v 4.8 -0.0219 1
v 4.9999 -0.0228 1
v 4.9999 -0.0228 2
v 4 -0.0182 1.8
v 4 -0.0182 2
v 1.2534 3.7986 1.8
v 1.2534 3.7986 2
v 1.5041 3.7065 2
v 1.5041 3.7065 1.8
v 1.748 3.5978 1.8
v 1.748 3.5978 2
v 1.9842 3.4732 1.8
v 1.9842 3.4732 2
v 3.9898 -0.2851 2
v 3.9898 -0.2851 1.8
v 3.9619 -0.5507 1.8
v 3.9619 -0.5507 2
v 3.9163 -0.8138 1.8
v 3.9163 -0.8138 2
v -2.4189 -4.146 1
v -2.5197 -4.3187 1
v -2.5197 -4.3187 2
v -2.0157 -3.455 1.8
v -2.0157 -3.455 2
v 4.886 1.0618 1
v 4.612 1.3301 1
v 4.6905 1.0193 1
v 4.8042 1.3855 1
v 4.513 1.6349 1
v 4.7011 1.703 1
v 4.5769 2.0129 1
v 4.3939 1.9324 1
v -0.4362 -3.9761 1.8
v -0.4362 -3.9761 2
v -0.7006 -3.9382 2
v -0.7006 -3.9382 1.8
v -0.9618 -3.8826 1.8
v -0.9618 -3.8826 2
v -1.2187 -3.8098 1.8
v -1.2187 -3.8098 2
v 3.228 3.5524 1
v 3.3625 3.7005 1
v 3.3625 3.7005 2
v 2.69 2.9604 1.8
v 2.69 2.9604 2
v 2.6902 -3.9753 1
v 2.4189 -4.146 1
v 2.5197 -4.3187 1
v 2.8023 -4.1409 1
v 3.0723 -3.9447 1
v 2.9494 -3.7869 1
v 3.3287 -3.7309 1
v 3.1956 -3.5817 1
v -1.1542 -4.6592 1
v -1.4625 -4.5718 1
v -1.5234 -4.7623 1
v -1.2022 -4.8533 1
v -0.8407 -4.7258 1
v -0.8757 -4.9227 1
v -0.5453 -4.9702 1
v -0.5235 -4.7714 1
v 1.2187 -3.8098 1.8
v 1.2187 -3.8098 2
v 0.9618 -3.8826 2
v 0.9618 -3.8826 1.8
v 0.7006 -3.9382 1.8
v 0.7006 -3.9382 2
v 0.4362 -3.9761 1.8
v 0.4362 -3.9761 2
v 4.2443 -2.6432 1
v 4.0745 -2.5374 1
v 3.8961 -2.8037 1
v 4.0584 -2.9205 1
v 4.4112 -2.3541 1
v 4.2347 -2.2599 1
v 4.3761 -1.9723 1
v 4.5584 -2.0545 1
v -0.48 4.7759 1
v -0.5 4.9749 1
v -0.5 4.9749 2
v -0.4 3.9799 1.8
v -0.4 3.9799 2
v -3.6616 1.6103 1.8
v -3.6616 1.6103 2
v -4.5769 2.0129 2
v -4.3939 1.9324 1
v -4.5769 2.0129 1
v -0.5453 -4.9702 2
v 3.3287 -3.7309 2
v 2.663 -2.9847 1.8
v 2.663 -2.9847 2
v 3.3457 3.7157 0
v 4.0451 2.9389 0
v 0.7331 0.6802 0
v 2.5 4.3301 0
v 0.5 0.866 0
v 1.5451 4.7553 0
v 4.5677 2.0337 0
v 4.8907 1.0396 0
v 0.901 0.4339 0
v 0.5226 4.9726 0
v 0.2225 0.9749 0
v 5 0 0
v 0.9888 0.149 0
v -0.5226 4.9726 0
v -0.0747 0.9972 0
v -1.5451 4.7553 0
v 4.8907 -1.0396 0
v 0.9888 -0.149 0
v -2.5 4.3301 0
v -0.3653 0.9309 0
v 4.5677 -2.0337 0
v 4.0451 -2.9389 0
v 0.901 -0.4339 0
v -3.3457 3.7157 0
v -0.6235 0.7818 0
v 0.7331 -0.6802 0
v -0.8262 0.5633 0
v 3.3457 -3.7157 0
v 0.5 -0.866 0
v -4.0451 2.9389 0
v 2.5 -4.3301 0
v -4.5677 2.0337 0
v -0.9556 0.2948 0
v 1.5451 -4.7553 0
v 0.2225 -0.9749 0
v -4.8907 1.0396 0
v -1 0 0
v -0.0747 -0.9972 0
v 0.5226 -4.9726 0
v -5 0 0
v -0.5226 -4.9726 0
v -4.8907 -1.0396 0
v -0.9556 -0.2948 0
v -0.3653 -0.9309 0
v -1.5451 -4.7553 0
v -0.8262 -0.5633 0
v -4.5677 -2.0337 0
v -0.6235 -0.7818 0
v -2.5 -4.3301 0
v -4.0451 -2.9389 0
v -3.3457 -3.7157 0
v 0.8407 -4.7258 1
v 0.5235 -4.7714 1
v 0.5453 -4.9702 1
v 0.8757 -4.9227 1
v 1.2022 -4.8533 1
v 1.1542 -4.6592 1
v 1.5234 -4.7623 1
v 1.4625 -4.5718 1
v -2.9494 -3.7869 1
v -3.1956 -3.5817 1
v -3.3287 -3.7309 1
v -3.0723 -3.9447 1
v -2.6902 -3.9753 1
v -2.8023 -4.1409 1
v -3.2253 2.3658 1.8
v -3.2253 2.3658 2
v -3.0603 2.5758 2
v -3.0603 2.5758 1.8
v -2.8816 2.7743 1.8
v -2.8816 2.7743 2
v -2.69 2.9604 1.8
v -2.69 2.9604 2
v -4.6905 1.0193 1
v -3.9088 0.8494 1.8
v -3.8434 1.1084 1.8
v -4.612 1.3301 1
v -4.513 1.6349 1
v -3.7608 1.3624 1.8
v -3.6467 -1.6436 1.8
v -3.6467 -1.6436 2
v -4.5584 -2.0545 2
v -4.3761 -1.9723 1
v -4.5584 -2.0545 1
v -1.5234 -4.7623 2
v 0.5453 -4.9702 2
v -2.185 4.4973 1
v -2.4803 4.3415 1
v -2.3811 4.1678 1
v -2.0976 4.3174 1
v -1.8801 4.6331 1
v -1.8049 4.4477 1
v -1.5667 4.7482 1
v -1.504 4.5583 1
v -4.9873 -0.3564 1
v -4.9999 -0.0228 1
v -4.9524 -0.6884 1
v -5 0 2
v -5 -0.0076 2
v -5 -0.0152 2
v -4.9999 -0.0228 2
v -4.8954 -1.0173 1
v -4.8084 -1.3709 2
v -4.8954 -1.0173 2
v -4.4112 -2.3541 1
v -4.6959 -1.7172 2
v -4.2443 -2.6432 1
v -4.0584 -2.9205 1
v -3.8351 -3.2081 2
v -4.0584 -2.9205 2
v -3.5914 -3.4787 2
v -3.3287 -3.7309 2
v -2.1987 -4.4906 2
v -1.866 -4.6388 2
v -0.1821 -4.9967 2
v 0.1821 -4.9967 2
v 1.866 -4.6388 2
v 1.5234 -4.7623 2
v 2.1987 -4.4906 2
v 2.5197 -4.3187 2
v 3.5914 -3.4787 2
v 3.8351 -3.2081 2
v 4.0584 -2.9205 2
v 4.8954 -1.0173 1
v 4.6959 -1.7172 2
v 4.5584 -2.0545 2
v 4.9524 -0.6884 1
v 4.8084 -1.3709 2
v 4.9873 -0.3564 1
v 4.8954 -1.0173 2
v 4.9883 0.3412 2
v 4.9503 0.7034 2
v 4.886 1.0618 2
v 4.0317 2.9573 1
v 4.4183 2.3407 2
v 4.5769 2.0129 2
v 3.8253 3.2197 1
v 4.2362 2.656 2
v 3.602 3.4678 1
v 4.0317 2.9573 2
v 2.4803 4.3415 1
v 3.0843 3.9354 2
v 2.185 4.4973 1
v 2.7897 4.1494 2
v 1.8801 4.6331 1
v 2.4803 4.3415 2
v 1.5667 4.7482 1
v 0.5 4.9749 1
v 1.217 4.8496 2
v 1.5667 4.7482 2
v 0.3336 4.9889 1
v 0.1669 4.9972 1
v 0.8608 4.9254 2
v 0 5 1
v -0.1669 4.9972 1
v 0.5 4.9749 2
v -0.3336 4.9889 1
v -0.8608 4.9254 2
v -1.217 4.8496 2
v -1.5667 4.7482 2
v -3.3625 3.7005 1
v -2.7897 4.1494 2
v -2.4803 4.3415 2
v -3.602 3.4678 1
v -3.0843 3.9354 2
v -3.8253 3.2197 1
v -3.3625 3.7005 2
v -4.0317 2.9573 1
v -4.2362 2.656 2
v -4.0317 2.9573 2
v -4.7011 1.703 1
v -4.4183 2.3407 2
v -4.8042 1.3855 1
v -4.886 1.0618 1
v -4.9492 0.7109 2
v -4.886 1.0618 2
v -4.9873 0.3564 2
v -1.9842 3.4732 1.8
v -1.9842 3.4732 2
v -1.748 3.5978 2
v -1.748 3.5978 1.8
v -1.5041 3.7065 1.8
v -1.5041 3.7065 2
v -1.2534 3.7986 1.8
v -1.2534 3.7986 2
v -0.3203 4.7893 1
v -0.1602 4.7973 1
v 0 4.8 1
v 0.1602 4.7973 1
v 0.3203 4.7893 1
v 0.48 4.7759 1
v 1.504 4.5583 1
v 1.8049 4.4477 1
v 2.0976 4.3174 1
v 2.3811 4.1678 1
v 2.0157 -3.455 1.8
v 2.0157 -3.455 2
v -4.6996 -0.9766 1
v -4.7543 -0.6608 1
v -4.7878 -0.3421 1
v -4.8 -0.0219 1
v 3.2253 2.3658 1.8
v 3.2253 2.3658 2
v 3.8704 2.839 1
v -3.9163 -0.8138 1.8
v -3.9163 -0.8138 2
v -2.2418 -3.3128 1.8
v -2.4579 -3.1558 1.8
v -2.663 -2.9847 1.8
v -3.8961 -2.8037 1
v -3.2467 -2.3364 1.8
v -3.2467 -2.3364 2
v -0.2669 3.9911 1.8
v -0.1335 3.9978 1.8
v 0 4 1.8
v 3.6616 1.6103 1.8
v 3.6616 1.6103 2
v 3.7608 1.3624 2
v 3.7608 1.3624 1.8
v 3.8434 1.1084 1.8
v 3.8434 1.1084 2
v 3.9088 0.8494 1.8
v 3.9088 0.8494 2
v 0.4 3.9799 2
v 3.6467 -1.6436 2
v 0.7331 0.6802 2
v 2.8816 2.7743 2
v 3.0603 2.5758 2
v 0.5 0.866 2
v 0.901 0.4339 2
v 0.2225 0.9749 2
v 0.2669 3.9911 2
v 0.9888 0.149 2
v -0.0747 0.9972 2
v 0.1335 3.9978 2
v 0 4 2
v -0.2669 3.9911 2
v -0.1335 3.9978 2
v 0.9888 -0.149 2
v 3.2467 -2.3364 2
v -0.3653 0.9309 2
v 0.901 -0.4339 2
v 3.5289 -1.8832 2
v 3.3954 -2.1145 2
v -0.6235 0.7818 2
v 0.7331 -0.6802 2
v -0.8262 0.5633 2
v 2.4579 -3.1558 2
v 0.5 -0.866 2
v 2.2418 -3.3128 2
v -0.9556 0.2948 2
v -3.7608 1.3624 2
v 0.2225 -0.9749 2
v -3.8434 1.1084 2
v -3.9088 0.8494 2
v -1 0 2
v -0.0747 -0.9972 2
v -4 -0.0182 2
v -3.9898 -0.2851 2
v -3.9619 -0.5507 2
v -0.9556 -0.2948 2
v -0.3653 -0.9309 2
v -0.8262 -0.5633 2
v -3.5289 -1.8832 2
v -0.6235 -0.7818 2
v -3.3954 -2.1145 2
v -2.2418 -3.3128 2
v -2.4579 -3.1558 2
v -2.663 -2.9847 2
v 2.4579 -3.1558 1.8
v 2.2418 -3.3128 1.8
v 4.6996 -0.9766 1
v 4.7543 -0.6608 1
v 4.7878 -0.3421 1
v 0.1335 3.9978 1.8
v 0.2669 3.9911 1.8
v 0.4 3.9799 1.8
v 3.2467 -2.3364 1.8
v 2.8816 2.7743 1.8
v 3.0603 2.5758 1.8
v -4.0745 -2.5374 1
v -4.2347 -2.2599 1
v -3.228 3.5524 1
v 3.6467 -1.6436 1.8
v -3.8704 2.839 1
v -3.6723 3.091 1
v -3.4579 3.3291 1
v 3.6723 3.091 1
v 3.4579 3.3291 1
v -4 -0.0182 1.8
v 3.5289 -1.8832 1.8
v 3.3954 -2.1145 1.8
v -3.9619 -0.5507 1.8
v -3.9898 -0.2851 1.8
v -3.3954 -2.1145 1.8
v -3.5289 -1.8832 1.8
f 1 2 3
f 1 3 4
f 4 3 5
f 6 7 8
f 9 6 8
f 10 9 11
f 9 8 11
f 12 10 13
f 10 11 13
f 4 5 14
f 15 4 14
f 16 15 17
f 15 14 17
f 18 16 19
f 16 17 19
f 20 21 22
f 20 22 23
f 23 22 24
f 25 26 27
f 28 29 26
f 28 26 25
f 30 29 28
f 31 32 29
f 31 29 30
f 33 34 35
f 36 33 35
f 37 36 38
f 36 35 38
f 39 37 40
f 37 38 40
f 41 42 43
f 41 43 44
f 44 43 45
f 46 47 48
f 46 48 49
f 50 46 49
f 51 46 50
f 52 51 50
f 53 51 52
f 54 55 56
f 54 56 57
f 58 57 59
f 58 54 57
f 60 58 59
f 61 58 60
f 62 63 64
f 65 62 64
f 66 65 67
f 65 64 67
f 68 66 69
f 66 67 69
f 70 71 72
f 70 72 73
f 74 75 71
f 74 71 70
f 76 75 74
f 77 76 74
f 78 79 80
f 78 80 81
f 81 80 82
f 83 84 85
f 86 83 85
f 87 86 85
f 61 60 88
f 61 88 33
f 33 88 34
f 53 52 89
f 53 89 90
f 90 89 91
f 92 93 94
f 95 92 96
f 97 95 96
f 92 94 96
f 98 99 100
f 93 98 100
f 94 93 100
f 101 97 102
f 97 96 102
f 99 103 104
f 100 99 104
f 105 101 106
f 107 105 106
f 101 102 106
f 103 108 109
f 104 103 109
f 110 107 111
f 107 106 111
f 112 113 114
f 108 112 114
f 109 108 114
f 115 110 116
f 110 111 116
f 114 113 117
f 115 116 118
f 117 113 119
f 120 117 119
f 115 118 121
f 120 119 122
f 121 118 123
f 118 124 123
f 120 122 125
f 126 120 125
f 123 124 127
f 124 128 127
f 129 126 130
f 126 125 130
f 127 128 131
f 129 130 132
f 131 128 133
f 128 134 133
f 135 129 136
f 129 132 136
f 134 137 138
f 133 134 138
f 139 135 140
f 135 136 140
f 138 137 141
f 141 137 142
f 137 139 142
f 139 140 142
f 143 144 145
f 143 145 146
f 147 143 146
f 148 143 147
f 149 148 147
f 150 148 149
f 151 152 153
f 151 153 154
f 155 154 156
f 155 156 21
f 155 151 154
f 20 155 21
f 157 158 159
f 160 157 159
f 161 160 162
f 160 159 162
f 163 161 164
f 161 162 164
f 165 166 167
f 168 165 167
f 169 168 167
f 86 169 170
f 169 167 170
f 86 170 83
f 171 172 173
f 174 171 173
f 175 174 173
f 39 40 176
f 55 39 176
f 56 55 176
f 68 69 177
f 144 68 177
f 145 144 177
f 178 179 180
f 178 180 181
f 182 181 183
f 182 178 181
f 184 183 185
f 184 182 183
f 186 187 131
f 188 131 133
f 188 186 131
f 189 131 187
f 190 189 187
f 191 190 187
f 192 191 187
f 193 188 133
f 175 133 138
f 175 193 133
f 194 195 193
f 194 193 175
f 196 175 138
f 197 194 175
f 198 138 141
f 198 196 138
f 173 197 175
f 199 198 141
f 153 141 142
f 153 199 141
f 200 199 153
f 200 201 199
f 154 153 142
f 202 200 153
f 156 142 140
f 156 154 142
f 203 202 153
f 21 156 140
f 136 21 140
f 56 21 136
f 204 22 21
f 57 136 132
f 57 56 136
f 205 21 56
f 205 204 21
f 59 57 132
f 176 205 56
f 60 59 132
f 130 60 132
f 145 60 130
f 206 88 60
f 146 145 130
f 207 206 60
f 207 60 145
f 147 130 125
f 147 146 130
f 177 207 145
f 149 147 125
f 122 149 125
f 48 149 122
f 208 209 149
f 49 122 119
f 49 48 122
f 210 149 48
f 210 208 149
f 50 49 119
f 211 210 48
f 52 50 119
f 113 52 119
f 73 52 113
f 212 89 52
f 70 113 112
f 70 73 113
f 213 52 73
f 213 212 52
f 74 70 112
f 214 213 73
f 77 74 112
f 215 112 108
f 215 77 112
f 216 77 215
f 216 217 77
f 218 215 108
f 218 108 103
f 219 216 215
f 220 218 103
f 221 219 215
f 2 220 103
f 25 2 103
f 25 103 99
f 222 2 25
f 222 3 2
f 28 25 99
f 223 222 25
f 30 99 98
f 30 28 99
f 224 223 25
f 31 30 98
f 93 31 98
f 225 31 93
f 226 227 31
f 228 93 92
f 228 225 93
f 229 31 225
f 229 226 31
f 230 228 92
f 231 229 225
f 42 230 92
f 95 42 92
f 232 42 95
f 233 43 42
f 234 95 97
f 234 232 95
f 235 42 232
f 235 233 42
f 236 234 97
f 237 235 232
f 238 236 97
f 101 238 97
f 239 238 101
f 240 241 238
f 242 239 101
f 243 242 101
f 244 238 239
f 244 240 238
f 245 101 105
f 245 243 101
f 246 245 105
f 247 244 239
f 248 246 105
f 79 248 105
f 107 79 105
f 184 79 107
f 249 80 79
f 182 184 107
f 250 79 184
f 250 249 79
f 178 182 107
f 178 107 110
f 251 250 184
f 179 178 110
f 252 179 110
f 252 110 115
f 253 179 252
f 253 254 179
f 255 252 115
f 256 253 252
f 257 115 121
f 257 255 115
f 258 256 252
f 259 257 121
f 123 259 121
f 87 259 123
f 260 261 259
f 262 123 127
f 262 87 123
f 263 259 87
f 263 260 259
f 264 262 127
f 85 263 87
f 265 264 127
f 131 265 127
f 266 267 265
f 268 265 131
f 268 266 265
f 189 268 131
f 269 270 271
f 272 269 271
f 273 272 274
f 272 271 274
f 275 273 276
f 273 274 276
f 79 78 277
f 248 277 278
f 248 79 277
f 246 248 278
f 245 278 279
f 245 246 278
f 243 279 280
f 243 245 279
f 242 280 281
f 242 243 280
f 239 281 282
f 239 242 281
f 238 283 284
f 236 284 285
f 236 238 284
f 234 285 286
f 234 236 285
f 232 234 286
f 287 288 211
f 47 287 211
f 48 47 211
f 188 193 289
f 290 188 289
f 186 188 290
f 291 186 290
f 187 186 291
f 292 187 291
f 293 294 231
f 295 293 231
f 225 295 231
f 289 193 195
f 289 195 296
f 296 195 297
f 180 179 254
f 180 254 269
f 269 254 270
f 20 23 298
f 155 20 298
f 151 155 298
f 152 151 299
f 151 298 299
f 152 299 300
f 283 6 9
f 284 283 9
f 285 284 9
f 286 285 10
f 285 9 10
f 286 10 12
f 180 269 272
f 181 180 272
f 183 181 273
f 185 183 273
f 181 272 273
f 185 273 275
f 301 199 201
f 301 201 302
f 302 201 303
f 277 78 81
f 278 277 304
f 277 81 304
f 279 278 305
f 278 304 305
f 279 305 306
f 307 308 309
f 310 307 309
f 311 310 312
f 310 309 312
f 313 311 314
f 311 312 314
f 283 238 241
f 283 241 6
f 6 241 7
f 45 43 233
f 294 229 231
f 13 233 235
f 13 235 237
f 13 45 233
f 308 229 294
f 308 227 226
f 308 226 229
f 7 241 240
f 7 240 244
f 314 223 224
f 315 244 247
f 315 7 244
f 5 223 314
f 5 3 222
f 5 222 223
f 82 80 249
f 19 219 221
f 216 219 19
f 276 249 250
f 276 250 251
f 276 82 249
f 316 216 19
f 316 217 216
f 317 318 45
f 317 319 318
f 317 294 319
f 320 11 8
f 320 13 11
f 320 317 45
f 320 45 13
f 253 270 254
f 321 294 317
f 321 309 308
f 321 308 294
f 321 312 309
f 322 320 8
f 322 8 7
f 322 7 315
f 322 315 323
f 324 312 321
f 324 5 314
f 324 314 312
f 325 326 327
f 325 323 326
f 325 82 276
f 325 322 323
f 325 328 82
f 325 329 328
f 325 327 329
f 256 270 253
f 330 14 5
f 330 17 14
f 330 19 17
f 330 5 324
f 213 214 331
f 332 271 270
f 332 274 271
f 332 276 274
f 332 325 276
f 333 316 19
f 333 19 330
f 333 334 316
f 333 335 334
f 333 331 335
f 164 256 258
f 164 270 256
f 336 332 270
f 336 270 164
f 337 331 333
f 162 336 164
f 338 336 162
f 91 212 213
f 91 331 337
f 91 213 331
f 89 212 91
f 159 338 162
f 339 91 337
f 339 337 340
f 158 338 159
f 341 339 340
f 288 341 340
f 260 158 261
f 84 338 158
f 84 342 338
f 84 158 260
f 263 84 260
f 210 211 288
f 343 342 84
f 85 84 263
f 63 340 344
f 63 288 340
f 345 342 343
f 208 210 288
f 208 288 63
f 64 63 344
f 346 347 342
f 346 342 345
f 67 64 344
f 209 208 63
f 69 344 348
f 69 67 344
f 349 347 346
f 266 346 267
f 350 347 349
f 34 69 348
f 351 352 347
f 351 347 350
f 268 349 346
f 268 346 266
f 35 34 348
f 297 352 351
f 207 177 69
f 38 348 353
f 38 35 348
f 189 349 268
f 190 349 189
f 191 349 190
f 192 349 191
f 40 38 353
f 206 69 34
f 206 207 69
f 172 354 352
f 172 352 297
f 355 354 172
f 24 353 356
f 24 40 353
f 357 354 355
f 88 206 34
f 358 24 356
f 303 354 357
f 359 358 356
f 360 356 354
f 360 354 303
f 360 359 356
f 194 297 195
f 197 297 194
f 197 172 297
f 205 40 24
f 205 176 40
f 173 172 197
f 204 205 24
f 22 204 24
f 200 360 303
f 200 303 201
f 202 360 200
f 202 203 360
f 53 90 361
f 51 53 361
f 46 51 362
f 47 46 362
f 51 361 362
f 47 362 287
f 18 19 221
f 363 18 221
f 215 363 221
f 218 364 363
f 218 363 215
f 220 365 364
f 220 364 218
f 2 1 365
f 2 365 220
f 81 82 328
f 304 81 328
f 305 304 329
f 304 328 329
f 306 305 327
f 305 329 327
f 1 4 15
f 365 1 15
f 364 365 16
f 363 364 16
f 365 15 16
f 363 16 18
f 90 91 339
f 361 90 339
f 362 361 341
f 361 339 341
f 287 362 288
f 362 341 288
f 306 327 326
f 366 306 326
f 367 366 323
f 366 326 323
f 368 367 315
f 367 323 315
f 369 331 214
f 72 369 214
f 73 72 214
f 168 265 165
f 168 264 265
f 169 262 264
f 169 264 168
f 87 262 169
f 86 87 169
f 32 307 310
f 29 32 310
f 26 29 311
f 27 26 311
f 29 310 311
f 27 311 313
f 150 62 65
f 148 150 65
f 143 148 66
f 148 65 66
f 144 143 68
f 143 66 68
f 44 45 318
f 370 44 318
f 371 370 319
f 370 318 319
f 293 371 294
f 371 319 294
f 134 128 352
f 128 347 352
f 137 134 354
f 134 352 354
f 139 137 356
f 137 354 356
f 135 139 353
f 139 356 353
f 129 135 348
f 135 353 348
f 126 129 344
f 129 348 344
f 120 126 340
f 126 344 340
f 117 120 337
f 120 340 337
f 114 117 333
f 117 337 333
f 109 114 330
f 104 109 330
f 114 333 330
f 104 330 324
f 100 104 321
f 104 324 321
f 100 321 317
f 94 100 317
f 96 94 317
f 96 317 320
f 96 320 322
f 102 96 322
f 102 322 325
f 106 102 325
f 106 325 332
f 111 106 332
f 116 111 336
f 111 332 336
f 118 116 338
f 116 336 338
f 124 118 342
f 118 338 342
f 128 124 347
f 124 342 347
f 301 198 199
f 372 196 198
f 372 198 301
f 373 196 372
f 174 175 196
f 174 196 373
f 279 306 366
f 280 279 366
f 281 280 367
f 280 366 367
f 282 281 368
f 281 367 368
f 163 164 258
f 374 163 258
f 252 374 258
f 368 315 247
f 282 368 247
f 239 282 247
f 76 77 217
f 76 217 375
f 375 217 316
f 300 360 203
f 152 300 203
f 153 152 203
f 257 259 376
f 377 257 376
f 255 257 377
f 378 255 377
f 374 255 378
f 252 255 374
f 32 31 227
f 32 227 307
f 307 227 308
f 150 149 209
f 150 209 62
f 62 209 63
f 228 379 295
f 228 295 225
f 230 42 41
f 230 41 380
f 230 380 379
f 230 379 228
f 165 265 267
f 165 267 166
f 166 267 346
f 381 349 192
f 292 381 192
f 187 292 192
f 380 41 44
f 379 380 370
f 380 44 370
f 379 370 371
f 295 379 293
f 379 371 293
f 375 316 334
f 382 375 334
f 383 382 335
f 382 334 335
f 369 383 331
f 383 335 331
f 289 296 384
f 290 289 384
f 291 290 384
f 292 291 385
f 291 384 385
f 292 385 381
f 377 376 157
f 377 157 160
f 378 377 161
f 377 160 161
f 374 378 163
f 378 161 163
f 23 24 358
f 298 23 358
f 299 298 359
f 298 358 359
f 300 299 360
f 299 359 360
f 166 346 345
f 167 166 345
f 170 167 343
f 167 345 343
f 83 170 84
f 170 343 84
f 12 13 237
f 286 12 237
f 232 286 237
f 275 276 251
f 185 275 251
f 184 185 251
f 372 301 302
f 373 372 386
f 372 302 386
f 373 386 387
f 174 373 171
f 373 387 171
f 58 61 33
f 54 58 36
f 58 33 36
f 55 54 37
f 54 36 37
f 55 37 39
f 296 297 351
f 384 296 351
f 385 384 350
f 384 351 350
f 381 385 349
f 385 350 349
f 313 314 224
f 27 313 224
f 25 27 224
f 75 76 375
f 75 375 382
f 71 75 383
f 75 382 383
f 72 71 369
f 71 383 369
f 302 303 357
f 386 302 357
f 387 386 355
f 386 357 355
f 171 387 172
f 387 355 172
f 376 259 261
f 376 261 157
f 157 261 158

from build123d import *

# Parameters (mm, degrees)
F0_W     = 4
F0_H     = 2
F3_DEPTH = 1
F4_SIZE  = 0.8


with BuildPart() as f1:
    # F0 (on Front) → F1 (revolve)
    with BuildSketch(Plane.XZ):
        with Locations((-3, 1)):
            Rectangle(F0_W, F0_H)
    revolve(axis=Axis((0, 0, 1), (0, 0, 1)))

    # F2 (on face) → F3 (cut)
    with BuildSketch(Plane.XY.offset(2)):
        with BuildLine():
            ThreePointArc((-0.4, 3.9799497484), (-0.2002511002, 3.9949842924), (0, 4))
            Line((0, 4), (0, 4.9749371855))
            Line((0, 4.9749371855), (-0.5, 4.9749371855))
            Line((-0.5, 4.9749371855), (-0.4, 3.9799497484))
        make_face()
        with BuildLine():
            Line((0, 4.9749371855), (0, 4))
            ThreePointArc((0, 4), (0.2002511002, 3.9949842924), (0.4, 3.9799497484))
            Line((0.4, 3.9799497484), (0.5, 4.9749371855))
            Line((0.5, 4.9749371855), (0, 4.9749371855))
        make_face()
        with BuildLine():
            Line((0, 5), (0, 4.9749371855))
            Line((0, 4.9749371855), (0.5, 4.9749371855))
            ThreePointArc((0.5, 4.9749371855), (0.2503138753, 4.9937303656), (0, 5))
        make_face()
        with BuildLine():
            Line((-0.5, 4.9749371855), (0, 4.9749371855))
            Line((0, 4.9749371855), (0, 5))
            ThreePointArc((0, 5), (-0.2503138753, 4.9937303656), (-0.5, 4.9749371855))
        make_face()
        with BuildLine():
            Line((1.5667165215, 4.7481995894), (1.2533732172, 3.7985596716))
            ThreePointArc((1.2533732172, 3.7985596716), (1.6269465723, 3.6541818306), (1.9842095833, 3.4731703571))
            Line((1.9842095833, 3.4731703571), (2.4802619792, 4.3414629464))
            ThreePointArc((2.4802619792, 4.3414629464), (2.0336832154, 4.5677272882), (1.5667165215, 4.7481995894))
        make_face()
        with BuildLine():
            Line((3.3625335233, 3.7004551483), (2.6900268187, 2.9603641186))
            ThreePointArc((2.6900268187, 2.9603641186), (2.9725793019, 2.6765224254), (3.2253313037, 2.3658482583))
            Line((3.2253313037, 2.3658482583), (4.0316641297, 2.9573103228))
            ThreePointArc((4.0316641297, 2.9573103228), (3.7157241274, 3.3456530318), (3.3625335233, 3.7004551483))
        make_face()
        with BuildLine():
            Line((4.5769379313, 2.0128683944), (3.661550345, 1.6102947155))
            ThreePointArc((3.661550345, 1.6102947155), (3.8042260652, 1.2360679775), (3.9087639405, 0.8494495025))
            Line((3.9087639405, 0.8494495025), (4.8859549256, 1.0618118781))
            ThreePointArc((4.8859549256, 1.0618118781), (4.7552825815, 1.5450849719), (4.5769379313, 2.0128683944))
        make_face()
        with BuildLine():
            Line((4.9999481907, -0.0227615912), (3.9999585526, -0.0182092729))
            ThreePointArc((3.9999585526, -0.0182092729), (3.9780875815, -0.4181138531), (3.916335782, -0.8138267892))
            Line((3.916335782, -0.8138267892), (4.8954197275, -1.0172834865))
            ThreePointArc((4.8954197275, -1.0172834865), (4.9726094768, -0.5226423163), (4.9999481907, -0.0227615912))
        make_face()
        with BuildLine():
            Line((4.5584219849, -2.0544558909), (3.6467375879, -1.6435647127))
            ThreePointArc((3.6467375879, -1.6435647127), (3.4641016151, -2), (3.2467375879, -2.3363850357))
            Line((3.2467375879, -2.3363850357), (4.0584219849, -2.9204812947))
            ThreePointArc((4.0584219849, -2.9204812947), (4.3301270189, -2.5), (4.5584219849, -2.0544558909))
        make_face()
        with BuildLine():
            Line((3.3287032059, -3.7309161029), (2.6629625647, -2.9847328823))
            ThreePointArc((2.6629625647, -2.9847328823), (2.3511410092, -3.2360679775), (2.0157489692, -3.4549610842))
            Line((2.0157489692, -3.4549610842), (2.5196862116, -4.3187013552))
            ThreePointArc((2.5196862116, -4.3187013552), (2.9389262615, -4.0450849719), (3.3287032059, -3.7309161029))
        make_face()
        with BuildLine():
            Line((1.5234214023, -4.7622670264), (1.2187371219, -3.8098136211))
            ThreePointArc((1.2187371219, -3.8098136211), (0.8316467633, -3.9125904029), (0.4362190413, -3.9761429738))
            Line((0.4362190413, -3.9761429738), (0.5452738016, -4.9701787172))
            ThreePointArc((0.5452738016, -4.9701787172), (1.0395584541, -4.8907380037), (1.5234214023, -4.7622670264))
        make_face()
        with BuildLine():
            Line((-0.5452738016, -4.9701787172), (-0.4362190413, -3.9761429738))
            ThreePointArc((-0.4362190413, -3.9761429738), (-0.8316467633, -3.9125904029), (-1.2187371219, -3.8098136211))
            Line((-1.2187371219, -3.8098136211), (-1.5234214023, -4.7622670264))
            ThreePointArc((-1.5234214023, -4.7622670264), (-1.0395584541, -4.8907380037), (-0.5452738016, -4.9701787172))
        make_face()
        with BuildLine():
            Line((-2.5196862116, -4.3187013552), (-2.0157489692, -3.4549610842))
            ThreePointArc((-2.0157489692, -3.4549610842), (-2.3511410092, -3.2360679775), (-2.6629625647, -2.9847328823))
            Line((-2.6629625647, -2.9847328823), (-3.3287032059, -3.7309161029))
            ThreePointArc((-3.3287032059, -3.7309161029), (-2.9389262615, -4.0450849719), (-2.5196862116, -4.3187013552))
        make_face()
        with BuildLine():
            Line((-4.0584219849, -2.9204812947), (-3.2467375879, -2.3363850357))
            ThreePointArc((-3.2467375879, -2.3363850357), (-3.4641016151, -2), (-3.6467375879, -1.6435647127))
            Line((-3.6467375879, -1.6435647127), (-4.5584219849, -2.0544558909))
            ThreePointArc((-4.5584219849, -2.0544558909), (-4.3301270189, -2.5), (-4.0584219849, -2.9204812947))
        make_face()
        with BuildLine():
            Line((-4.8954197275, -1.0172834865), (-3.916335782, -0.8138267892))
            ThreePointArc((-3.916335782, -0.8138267892), (-3.9780875815, -0.4181138531), (-3.9999585526, -0.0182092729))
            Line((-3.9999585526, -0.0182092729), (-4.9999481907, -0.0227615912))
            ThreePointArc((-4.9999481907, -0.0227615912), (-4.9726094768, -0.5226423163), (-4.8954197275, -1.0172834865))
        make_face()
        with BuildLine():
            Line((-4.8859549256, 1.0618118781), (-3.9087639405, 0.8494495025))
            ThreePointArc((-3.9087639405, 0.8494495025), (-3.8042260652, 1.2360679775), (-3.661550345, 1.6102947155))
            Line((-3.661550345, 1.6102947155), (-4.5769379313, 2.0128683944))
            ThreePointArc((-4.5769379313, 2.0128683944), (-4.7552825815, 1.5450849719), (-4.8859549256, 1.0618118781))
        make_face()
        with BuildLine():
            Line((-4.0316641297, 2.9573103228), (-3.2253313037, 2.3658482583))
            ThreePointArc((-3.2253313037, 2.3658482583), (-2.9725793019, 2.6765224254), (-2.6900268187, 2.9603641186))
            Line((-2.6900268187, 2.9603641186), (-3.3625335233, 3.7004551483))
            ThreePointArc((-3.3625335233, 3.7004551483), (-3.7157241274, 3.3456530318), (-4.0316641297, 2.9573103228))
        make_face()
        with BuildLine():
            Line((-2.4802619792, 4.3414629464), (-1.9842095833, 3.4731703571))
            ThreePointArc((-1.9842095833, 3.4731703571), (-1.6269465723, 3.6541818306), (-1.2533732172, 3.7985596716))
            Line((-1.2533732172, 3.7985596716), (-1.5667165215, 4.7481995894))
            ThreePointArc((-1.5667165215, 4.7481995894), (-2.0336832154, 4.5677272882), (-2.4802619792, 4.3414629464))
        make_face()
    extrude(amount=-F3_DEPTH, mode=Mode.SUBTRACT)

    # F4
    f4_edges = [f1.edges().sort_by_distance(p)[0] for p in [
        (-3.978088, -0.418114, 1),
        (-3.464102, -2, 1),
        (-2.351141, -3.236068, 1),
        (-0.831647, -3.91259, 1),
        (0.831647, -3.91259, 1),
        (2.351141, -3.236068, 1),
        (3.464102, -2, 1),
        (3.978088, -0.418114, 1),
        (3.804226, 1.236068, 1),
        (2.972579, 2.676522, 1),
        (1.626947, 3.654182, 1),
        (0, 4, 1),
        (-1.626947, 3.654182, 1),
        (-2.972579, 2.676522, 1),
        (-3.804226, 1.236068, 1),
    ]]
    chamfer(f4_edges, length=F4_SIZE)


solid = f1.part
